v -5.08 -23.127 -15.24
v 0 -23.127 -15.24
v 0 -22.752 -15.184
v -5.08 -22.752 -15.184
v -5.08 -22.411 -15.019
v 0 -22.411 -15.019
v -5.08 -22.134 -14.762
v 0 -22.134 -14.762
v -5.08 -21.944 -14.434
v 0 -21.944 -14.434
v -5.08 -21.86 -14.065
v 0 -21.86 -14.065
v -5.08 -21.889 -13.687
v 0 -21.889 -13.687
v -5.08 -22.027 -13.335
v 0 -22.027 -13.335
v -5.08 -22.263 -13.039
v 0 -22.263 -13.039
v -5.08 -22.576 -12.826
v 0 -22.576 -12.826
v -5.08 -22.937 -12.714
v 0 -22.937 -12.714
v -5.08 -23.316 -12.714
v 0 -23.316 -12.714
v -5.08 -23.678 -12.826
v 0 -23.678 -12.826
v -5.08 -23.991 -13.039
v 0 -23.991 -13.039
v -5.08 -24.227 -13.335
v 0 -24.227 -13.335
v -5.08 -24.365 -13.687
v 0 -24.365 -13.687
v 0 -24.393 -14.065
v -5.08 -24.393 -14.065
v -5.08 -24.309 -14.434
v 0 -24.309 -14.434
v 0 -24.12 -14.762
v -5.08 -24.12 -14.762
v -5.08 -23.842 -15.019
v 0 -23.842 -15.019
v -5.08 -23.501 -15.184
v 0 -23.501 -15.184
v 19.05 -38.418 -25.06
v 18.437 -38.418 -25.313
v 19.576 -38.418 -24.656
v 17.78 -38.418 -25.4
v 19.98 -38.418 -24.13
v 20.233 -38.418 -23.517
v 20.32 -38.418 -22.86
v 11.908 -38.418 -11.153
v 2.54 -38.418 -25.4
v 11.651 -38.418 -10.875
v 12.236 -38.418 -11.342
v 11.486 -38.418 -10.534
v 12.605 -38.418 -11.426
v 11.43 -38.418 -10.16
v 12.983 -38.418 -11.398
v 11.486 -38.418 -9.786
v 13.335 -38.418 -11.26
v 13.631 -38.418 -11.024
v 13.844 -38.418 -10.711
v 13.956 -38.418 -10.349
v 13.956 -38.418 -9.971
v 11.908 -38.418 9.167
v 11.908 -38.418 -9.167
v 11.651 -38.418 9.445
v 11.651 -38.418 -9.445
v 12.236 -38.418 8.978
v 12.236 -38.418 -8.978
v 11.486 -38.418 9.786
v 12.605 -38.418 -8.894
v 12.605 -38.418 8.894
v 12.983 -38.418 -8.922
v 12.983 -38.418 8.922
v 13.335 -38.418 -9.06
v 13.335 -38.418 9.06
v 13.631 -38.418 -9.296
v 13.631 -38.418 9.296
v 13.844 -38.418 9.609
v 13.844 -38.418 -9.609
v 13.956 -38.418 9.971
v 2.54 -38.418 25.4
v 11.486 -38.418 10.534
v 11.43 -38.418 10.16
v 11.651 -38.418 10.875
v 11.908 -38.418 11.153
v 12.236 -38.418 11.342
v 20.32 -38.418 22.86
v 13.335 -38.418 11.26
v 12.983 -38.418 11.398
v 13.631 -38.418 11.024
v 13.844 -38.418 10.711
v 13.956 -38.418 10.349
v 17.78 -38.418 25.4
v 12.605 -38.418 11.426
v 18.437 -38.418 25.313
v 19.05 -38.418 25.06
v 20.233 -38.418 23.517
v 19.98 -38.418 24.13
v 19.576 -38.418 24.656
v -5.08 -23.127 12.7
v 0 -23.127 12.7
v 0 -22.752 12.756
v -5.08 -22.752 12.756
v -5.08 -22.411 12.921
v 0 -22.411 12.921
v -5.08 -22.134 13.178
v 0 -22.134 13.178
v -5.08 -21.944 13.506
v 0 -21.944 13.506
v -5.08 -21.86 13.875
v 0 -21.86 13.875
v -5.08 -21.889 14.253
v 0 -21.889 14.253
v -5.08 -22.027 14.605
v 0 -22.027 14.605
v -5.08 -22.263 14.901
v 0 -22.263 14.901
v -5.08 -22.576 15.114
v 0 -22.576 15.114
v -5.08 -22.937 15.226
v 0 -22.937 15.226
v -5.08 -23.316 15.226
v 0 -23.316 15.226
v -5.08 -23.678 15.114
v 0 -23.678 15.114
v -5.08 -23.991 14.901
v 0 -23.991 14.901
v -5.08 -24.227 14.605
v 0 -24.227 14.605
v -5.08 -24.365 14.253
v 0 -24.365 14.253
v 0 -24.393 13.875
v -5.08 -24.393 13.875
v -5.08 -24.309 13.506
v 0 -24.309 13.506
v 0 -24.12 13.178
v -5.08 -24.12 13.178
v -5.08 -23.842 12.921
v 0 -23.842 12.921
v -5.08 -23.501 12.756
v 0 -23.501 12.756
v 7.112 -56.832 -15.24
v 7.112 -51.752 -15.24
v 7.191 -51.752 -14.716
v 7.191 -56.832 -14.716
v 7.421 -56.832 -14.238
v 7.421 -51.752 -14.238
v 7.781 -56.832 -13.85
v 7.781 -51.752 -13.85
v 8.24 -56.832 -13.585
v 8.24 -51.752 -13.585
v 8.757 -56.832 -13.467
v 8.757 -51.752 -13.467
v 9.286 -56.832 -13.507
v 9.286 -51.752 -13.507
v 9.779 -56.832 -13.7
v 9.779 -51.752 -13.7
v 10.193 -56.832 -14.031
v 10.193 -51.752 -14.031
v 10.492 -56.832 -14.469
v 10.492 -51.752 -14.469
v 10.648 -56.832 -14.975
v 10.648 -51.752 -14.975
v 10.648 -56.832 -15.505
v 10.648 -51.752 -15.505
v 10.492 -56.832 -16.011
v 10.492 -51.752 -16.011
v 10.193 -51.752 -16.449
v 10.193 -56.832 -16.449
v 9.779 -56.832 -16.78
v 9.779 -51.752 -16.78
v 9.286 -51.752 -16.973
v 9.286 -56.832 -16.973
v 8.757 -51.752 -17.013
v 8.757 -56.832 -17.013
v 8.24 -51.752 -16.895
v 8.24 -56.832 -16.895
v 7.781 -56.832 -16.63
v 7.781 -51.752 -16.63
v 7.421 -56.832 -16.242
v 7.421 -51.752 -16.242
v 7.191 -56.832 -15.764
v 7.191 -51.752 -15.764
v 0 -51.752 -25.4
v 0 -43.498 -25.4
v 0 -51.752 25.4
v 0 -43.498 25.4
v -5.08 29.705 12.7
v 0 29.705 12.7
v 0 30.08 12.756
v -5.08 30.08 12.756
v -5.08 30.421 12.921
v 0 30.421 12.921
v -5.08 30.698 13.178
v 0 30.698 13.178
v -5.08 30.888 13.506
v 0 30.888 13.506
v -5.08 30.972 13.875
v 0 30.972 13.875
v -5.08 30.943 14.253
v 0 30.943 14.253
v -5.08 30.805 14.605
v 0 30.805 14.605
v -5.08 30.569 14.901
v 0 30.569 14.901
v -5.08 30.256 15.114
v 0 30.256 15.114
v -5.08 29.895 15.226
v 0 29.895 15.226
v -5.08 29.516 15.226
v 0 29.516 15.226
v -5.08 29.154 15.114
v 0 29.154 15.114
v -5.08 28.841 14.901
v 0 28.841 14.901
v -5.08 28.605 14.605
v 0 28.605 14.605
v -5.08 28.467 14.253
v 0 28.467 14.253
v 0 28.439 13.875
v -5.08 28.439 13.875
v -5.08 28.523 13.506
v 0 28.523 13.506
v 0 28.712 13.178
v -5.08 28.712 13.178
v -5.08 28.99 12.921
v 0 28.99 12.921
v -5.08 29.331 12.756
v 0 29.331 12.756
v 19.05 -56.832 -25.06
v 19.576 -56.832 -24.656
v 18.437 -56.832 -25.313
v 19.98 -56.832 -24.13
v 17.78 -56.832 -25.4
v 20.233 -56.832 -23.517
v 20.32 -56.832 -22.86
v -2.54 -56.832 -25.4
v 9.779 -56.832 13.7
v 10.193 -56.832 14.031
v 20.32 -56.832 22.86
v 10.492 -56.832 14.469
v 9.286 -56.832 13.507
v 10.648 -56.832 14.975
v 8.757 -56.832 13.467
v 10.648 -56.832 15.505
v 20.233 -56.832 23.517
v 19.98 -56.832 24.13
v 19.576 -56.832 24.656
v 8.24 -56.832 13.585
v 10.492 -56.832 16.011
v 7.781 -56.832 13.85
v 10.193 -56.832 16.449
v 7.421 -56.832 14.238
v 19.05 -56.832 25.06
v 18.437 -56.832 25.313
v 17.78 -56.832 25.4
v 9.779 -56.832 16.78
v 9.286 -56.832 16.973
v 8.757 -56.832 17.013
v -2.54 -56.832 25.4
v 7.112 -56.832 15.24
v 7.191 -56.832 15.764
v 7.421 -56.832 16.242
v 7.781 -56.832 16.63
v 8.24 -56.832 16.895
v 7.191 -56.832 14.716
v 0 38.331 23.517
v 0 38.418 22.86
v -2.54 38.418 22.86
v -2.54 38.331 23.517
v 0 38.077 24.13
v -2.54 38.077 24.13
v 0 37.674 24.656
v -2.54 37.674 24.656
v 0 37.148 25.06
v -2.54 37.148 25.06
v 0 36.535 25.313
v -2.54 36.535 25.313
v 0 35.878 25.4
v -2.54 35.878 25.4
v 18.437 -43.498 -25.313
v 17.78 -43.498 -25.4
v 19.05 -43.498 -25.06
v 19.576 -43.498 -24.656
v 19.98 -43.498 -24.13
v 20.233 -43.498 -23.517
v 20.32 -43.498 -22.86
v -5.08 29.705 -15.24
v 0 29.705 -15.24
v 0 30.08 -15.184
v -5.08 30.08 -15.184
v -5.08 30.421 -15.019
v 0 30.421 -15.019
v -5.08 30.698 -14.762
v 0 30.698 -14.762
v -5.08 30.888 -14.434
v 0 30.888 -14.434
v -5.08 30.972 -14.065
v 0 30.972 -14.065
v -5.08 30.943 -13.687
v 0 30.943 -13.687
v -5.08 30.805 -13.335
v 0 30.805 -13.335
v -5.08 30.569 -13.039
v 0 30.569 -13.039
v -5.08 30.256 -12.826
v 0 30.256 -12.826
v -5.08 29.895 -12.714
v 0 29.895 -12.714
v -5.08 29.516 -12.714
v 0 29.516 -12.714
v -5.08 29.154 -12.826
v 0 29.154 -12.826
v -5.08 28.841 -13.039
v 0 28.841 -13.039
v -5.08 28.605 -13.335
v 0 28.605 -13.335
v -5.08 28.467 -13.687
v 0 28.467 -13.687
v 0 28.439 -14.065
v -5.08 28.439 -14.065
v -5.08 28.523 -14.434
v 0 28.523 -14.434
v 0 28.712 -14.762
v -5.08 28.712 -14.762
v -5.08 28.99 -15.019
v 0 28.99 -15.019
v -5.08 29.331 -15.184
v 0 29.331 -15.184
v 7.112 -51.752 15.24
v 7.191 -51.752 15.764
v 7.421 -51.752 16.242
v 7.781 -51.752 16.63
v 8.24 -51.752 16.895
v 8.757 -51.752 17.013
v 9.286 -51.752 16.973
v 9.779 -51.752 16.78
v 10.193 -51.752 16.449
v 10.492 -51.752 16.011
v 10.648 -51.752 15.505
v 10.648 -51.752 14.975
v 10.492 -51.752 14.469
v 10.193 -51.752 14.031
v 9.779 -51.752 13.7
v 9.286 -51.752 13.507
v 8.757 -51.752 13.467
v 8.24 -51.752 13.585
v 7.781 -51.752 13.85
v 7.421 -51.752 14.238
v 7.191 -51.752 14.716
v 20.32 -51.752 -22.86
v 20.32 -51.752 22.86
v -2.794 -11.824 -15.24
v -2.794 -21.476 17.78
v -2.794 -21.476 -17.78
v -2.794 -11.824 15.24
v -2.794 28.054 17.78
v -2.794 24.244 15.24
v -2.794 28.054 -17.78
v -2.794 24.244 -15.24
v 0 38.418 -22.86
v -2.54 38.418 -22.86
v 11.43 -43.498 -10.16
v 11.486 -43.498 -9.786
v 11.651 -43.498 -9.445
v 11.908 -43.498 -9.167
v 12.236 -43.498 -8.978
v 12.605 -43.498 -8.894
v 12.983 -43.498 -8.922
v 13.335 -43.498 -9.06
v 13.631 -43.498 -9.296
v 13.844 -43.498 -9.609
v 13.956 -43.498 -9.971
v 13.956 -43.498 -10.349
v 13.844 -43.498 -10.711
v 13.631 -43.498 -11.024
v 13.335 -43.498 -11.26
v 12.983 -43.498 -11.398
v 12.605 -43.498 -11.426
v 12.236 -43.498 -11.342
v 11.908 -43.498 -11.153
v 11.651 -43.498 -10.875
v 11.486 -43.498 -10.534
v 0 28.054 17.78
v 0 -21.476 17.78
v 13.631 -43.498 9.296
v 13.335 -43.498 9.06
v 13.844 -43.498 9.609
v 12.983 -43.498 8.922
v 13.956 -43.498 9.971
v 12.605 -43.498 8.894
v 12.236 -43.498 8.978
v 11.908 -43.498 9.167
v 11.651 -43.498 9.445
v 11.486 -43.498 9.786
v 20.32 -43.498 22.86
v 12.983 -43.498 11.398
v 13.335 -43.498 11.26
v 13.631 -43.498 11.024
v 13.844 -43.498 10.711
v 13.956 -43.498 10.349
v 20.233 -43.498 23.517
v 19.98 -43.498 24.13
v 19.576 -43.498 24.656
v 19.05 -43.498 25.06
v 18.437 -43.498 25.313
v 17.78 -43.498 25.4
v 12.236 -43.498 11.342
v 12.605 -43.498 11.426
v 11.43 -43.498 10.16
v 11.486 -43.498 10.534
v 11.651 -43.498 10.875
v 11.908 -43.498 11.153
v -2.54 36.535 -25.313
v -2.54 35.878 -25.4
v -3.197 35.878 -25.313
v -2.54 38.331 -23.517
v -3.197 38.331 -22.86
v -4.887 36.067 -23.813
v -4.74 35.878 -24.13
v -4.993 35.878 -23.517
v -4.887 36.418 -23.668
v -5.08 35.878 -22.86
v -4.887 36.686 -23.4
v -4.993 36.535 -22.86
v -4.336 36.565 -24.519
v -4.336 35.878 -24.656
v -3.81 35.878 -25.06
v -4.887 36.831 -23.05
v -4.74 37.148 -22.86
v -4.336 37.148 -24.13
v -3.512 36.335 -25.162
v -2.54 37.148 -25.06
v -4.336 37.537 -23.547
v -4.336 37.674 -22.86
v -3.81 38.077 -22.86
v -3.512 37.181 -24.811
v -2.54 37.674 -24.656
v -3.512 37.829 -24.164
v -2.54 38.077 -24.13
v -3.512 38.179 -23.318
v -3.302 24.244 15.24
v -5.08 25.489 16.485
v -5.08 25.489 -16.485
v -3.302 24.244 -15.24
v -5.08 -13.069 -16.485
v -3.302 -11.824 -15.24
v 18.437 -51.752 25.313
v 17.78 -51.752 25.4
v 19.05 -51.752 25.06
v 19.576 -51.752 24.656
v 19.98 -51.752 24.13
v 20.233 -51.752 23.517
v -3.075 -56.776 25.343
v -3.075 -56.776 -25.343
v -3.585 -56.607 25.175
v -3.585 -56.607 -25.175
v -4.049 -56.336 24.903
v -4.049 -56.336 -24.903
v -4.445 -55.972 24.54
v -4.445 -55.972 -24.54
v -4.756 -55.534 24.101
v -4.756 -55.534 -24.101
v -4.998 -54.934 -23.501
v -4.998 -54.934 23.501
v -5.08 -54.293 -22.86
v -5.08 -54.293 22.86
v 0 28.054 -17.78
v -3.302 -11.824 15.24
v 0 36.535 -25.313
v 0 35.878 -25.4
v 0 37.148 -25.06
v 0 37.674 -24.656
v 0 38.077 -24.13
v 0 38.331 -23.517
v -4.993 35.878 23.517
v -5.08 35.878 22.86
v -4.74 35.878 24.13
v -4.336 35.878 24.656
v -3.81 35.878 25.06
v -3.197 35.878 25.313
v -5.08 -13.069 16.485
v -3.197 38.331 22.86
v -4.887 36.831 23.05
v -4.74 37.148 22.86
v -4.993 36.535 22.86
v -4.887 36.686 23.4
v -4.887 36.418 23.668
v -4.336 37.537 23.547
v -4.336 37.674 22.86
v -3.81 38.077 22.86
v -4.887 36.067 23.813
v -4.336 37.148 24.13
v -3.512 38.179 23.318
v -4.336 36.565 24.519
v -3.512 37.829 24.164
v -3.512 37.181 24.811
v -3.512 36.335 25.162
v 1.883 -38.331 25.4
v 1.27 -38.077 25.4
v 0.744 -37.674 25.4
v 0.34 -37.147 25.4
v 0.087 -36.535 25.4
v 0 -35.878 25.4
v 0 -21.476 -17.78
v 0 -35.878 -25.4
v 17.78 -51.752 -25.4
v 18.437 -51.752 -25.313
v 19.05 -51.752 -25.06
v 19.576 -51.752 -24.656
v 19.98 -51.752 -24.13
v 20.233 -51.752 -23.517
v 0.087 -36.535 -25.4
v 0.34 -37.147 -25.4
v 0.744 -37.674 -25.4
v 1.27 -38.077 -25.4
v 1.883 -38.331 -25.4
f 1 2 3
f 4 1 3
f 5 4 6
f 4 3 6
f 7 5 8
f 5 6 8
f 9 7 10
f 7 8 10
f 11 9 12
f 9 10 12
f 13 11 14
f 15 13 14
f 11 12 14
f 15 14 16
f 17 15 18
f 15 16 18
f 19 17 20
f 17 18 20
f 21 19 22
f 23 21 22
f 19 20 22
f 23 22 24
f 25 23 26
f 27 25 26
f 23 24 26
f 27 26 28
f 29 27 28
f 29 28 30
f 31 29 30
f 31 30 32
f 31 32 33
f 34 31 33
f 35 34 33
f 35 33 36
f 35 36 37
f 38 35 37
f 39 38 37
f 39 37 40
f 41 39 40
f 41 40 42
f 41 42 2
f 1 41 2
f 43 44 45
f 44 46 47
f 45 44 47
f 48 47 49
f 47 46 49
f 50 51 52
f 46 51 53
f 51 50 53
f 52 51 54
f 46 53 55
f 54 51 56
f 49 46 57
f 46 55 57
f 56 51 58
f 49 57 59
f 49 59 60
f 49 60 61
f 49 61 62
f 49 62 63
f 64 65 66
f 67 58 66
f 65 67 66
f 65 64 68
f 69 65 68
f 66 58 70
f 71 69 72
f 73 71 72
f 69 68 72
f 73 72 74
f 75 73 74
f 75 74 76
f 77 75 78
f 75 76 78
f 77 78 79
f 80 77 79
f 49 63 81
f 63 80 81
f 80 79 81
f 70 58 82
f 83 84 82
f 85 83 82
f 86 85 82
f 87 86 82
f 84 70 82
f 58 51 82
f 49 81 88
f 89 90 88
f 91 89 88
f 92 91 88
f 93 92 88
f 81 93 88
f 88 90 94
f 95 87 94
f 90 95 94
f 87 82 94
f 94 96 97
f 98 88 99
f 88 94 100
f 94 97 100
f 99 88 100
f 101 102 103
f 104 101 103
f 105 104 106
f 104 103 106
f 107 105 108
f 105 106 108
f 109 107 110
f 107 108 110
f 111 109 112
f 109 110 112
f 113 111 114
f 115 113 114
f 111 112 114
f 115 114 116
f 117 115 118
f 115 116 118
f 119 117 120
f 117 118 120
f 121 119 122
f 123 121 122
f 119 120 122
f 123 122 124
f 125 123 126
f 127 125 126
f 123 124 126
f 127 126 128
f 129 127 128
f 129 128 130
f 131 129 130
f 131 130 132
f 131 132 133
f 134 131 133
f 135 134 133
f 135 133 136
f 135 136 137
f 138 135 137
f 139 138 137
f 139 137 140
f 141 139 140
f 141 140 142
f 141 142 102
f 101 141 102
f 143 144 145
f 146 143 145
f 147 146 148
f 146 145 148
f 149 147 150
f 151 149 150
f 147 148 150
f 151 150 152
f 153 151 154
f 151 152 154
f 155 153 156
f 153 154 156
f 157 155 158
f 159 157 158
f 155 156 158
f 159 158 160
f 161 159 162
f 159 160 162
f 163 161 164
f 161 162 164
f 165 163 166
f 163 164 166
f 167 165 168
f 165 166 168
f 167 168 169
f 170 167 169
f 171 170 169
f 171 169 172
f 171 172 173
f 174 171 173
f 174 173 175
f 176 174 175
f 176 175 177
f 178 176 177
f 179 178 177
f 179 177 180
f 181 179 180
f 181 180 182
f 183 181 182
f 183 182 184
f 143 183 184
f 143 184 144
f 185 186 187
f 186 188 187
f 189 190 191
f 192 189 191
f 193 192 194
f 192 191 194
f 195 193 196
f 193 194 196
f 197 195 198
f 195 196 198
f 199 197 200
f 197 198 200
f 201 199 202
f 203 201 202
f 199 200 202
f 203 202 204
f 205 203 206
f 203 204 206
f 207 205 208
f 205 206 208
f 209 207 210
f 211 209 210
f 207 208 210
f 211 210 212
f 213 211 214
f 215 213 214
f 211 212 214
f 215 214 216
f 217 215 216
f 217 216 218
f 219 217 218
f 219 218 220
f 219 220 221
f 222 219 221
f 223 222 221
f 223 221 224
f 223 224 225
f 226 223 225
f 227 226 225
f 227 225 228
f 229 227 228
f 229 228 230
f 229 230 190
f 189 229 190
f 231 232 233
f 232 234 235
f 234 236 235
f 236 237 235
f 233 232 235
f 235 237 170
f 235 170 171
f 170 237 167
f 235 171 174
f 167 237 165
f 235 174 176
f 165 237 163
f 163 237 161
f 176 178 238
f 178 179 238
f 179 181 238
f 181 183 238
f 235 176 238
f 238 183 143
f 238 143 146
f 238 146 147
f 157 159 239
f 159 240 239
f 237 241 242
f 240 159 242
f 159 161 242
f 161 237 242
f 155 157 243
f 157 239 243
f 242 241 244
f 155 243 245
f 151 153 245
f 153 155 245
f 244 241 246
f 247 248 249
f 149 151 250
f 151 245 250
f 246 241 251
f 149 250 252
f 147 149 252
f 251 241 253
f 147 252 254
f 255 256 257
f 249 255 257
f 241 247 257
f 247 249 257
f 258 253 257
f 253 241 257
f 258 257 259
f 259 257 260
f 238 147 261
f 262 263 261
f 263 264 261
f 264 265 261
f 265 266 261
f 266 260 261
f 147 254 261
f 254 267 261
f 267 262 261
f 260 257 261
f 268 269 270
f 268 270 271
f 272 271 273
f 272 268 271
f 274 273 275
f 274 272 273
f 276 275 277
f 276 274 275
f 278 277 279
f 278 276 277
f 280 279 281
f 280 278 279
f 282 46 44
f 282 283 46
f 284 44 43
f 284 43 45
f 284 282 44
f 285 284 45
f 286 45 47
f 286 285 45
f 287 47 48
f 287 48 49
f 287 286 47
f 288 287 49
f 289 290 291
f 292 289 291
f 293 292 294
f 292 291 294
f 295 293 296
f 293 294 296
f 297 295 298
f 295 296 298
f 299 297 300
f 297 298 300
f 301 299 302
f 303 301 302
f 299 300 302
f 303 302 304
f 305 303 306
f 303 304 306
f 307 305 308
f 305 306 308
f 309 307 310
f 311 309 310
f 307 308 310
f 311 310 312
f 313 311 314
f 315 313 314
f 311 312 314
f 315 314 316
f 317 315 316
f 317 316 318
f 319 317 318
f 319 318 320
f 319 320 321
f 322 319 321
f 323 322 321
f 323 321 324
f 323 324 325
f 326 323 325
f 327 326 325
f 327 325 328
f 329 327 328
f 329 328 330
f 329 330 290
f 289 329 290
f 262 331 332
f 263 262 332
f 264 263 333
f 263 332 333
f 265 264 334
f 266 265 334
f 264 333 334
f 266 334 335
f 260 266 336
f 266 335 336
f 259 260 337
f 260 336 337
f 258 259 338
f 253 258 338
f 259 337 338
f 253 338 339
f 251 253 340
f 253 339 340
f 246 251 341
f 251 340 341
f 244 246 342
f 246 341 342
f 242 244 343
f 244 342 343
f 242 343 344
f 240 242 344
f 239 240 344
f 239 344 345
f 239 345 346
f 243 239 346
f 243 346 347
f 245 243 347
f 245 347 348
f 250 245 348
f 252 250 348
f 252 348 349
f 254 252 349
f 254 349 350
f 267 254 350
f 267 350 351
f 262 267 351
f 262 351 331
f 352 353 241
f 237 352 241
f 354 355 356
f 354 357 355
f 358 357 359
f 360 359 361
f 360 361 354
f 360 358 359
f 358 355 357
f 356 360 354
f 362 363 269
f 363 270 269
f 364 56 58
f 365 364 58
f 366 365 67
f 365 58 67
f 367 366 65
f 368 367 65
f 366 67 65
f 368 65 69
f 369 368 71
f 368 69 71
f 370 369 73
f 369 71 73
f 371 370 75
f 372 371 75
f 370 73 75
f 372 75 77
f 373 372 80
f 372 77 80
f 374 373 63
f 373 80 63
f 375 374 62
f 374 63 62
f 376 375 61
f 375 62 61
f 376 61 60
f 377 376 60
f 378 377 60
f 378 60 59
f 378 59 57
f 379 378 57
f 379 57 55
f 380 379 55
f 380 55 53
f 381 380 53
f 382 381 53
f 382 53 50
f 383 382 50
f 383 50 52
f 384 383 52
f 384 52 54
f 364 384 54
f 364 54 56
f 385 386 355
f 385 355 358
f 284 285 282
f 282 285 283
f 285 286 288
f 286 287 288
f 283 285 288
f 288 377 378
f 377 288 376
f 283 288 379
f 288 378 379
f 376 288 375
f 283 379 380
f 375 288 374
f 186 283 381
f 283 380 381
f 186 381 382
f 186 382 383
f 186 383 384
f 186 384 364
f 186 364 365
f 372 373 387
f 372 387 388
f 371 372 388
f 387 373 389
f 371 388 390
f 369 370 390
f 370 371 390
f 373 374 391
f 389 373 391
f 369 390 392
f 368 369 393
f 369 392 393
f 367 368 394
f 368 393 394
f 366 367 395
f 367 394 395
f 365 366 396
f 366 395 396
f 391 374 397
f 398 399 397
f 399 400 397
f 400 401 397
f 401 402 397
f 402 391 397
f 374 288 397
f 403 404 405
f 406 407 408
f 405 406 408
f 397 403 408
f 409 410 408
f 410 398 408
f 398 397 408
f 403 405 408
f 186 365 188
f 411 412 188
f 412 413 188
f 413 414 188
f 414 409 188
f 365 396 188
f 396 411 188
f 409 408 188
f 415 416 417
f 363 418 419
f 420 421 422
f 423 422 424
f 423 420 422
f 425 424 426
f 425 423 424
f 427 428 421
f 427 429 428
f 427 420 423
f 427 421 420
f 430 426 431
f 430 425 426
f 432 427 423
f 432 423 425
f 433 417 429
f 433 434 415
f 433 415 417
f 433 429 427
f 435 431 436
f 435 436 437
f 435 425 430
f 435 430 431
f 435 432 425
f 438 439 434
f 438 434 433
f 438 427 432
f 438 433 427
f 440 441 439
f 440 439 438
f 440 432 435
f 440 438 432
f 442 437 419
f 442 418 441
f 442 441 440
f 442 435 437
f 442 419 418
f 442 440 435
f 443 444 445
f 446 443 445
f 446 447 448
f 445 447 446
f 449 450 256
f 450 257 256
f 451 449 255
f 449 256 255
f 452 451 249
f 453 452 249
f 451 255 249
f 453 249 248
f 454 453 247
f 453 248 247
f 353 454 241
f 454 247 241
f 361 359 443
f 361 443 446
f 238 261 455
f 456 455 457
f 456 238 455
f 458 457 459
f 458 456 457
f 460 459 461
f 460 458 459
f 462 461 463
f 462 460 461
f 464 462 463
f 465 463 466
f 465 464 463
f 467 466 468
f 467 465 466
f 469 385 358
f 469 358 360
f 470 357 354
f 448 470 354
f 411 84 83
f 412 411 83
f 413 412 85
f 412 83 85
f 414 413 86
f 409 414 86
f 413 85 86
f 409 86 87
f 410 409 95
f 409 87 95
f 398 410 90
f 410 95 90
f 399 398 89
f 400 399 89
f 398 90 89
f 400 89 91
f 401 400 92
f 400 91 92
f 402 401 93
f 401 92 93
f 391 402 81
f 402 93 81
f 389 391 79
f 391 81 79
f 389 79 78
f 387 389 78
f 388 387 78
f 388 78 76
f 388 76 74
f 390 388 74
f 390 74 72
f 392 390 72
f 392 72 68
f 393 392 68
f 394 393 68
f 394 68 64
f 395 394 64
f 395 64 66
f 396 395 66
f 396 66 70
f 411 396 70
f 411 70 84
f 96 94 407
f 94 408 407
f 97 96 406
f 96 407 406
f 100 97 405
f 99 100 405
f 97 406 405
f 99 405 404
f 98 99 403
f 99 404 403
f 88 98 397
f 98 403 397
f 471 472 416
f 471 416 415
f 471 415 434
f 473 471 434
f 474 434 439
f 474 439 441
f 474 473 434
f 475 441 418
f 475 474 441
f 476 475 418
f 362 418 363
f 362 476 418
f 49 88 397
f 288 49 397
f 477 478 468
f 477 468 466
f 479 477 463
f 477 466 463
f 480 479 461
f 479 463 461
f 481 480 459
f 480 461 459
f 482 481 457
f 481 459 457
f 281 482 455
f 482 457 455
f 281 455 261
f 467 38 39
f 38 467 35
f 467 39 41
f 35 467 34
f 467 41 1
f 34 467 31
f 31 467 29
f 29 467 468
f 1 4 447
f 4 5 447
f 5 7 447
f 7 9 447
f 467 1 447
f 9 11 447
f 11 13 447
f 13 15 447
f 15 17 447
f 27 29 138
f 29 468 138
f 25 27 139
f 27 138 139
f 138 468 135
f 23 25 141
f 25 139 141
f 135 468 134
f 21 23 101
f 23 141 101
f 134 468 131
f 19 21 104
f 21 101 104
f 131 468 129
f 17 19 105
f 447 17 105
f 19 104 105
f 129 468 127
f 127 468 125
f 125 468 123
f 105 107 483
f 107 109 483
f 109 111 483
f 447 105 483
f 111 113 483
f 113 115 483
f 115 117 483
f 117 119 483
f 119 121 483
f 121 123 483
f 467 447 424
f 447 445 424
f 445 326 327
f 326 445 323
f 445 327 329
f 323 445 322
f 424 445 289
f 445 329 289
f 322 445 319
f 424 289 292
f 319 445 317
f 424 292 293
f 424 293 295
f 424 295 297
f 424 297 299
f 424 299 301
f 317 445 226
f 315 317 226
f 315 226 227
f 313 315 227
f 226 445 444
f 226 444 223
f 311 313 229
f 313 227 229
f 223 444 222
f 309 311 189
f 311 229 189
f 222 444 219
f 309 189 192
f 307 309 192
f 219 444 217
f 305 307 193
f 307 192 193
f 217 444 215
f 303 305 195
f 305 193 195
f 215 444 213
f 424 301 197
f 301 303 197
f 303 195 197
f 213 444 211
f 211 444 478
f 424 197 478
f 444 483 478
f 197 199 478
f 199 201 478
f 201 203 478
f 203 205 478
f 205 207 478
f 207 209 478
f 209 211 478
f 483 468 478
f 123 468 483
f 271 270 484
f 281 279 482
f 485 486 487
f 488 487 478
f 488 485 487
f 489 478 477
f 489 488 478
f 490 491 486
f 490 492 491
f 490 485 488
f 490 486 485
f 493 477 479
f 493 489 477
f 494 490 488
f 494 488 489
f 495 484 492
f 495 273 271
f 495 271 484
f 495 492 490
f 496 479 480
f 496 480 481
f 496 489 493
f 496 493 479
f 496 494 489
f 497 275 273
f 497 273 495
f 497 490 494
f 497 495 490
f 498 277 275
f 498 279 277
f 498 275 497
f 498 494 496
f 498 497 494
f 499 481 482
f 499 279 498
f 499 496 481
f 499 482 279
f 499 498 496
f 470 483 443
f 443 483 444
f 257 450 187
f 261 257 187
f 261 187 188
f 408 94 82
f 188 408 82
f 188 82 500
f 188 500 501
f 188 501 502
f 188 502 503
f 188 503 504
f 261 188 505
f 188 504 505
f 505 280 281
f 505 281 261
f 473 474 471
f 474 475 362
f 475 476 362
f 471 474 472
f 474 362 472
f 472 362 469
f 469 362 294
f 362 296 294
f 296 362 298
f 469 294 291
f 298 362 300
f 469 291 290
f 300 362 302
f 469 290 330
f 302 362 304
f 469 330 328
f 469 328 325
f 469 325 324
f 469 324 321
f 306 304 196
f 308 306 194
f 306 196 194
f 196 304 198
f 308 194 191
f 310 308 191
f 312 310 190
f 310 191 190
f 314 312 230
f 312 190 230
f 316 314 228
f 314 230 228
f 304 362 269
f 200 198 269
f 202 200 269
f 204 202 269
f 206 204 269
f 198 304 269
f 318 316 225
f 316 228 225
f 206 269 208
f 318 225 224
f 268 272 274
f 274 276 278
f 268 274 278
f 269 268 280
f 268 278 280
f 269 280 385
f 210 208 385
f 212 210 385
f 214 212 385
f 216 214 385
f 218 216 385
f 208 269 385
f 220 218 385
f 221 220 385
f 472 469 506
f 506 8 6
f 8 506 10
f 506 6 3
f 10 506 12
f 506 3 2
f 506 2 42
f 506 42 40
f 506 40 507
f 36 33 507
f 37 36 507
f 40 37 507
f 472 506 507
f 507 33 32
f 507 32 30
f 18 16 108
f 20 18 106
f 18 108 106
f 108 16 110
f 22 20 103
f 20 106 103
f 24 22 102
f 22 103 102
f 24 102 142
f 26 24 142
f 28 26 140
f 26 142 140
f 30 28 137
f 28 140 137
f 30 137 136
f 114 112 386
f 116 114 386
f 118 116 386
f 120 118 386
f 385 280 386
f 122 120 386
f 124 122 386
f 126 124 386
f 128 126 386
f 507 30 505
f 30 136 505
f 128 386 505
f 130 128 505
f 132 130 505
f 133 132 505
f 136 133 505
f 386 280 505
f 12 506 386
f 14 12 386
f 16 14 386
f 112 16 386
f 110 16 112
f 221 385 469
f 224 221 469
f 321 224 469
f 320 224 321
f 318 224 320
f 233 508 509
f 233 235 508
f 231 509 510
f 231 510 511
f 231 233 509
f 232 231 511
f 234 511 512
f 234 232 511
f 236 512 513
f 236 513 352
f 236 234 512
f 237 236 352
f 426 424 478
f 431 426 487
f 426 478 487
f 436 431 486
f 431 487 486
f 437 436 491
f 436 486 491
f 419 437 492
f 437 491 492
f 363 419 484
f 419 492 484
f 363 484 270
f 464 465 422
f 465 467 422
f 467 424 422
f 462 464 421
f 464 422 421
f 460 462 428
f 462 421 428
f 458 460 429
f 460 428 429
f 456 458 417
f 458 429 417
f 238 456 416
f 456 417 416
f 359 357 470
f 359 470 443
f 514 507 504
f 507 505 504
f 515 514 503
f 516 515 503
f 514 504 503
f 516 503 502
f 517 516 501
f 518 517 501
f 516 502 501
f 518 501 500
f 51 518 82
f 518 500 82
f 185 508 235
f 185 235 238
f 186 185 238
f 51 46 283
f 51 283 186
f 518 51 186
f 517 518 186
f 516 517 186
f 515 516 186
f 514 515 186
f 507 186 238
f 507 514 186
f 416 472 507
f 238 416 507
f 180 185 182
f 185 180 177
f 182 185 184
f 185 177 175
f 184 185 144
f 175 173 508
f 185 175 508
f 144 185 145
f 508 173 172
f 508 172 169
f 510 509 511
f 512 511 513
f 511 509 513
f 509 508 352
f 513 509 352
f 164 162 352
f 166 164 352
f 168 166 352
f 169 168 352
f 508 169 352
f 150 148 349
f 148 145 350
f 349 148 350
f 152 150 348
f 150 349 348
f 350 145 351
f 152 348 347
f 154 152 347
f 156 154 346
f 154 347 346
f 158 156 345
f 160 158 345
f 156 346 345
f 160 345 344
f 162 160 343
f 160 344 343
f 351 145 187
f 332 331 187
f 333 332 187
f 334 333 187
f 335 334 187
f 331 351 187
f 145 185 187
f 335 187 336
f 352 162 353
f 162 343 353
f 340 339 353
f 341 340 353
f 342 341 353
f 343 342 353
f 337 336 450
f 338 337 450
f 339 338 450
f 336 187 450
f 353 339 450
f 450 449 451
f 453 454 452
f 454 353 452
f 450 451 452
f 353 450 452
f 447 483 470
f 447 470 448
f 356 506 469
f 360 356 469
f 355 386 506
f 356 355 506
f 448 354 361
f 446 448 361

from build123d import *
from OCP.BRepFilletAPI import BRepFilletAPI_MakeChamfer

# Parameters (mm, degrees)
BOSS_EXTRUDE7_DEPTH = 25.4
SKETCH14_W          = 30.48
SKETCH14_H          = 36.068
CUT_EXTRUDE3_DEPTH  = 66.482787481
SKETCH15_W          = 35.56
SKETCH15_H          = 49.53
CUT_EXTRUDE4_DEPTH  = 2.794
CHAMFER1_SIZE       = 1.778
CHAMFER1_SIZE2      = 1.244969003
SKETCH16_R          = 1.27
CUT_EXTRUDE5_DEPTH  = 66.482787481
FILLET4_R           = 2.54
FILLET5_R           = 2.54
SKETCH23_R          = 1.778
CUT_EXTRUDE6_DEPTH  = 96.857661666
FILLET6_R           = 2.54
CUT_EXTRUDE7_REACH  = 85.437
SKETCH24_R          = 1.27
FILLET7_R           = 2.54


with BuildPart() as part:
    # Sketch12 → Boss-Extrude7 (new, symmetric)
    with BuildSketch(Plane.XY):
        Polygon((0, -38.4175), (20.32, -38.4175), (20.32, -43.4975), (0, -43.4975), (0, -51.7525), (20.32, -51.7525), (20.32, -56.8325), (-5.08, -56.8325), (-5.08, 38.4175), (0, 38.4175), align=None)
    extrude(amount=BOSS_EXTRUDE7_DEPTH, both=True)

    # Sketch14 → Cut-Extrude3 (cut, through all)
    with BuildSketch(Plane(origin=(0, 0, 0), x_dir=(0, 0, -1), z_dir=(1, 0, 0))):
        with Locations((0, 6.2103)):
            Rectangle(SKETCH14_W, SKETCH14_H)
    extrude(amount=-CUT_EXTRUDE3_DEPTH, mode=Mode.SUBTRACT)

    # Sketch15 → Cut-Extrude4 (cut)
    with BuildSketch(Plane(origin=(0, 0, 0), x_dir=(0, 0, -1), z_dir=(1, 0, 0))):
        with Locations((0, 3.2893)):
            Rectangle(SKETCH15_W, SKETCH15_H)
    extrude(amount=-CUT_EXTRUDE4_DEPTH, mode=Mode.SUBTRACT)

    # Chamfer1: one chamfer whose edges measure the first distance from different faces: ONE call of the kernel's chamfer builder (chamfer() names one face for all edges)
    chamfer1_edges_1 = [part.edges().sort_by_distance(p)[0] for p in [
        (-5.08, 6.2103, -15.24),
    ]]
    chamfer1_side_1 = [part.faces().sort_by_distance(p)[0] for p in [
        (-3.937, 6.2103, -15.24),
    ]]
    chamfer1_edges_2 = [part.edges().sort_by_distance(p)[0] for p in [
        (-5.08, -11.8237, 0),
    ]]
    chamfer1_side_2 = [part.faces().sort_by_distance(p)[0] for p in [
        (-3.937, -11.8237, 0),
    ]]
    chamfer1_edges_3 = [part.edges().sort_by_distance(p)[0] for p in [
        (-5.08, 6.2103, 15.24),
    ]]
    chamfer1_side_3 = [part.faces().sort_by_distance(p)[0] for p in [
        (-3.937, 6.2103, 15.24),
    ]]
    chamfer1_edges_4 = [part.edges().sort_by_distance(p)[0] for p in [
        (-5.08, 24.2443, 0),
    ]]
    chamfer1_side_4 = [part.faces().sort_by_distance(p)[0] for p in [
        (-3.937, 24.2443, 0),
    ]]
    chamfer1 = BRepFilletAPI_MakeChamfer(part.part.solid().wrapped)
    for e in chamfer1_edges_1:
        chamfer1.Add(CHAMFER1_SIZE, CHAMFER1_SIZE2, e.wrapped, chamfer1_side_1[0].wrapped)  # the first distance lies on this face
    for e in chamfer1_edges_2:
        chamfer1.Add(CHAMFER1_SIZE, CHAMFER1_SIZE2, e.wrapped, chamfer1_side_2[0].wrapped)  # the first distance lies on this face
    for e in chamfer1_edges_3:
        chamfer1.Add(CHAMFER1_SIZE, CHAMFER1_SIZE2, e.wrapped, chamfer1_side_3[0].wrapped)  # the first distance lies on this face
    for e in chamfer1_edges_4:
        chamfer1.Add(CHAMFER1_SIZE, CHAMFER1_SIZE2, e.wrapped, chamfer1_side_4[0].wrapped)  # the first distance lies on this face
    add(Compound.cast(chamfer1.Shape()), mode=Mode.REPLACE)

    # Sketch16 → Cut-Extrude5 (cut, through all)
    with BuildSketch(Plane(origin=(0, 0, 0), x_dir=(0, 0, -1), z_dir=(1, 0, 0))):
        with Locations((-13.97, 29.7053)):
            Circle(SKETCH16_R)
        with Locations((13.97, 29.7053)):
            Circle(SKETCH16_R)
        with Locations((-13.97, -23.1267)):
            Circle(SKETCH16_R)
        with Locations((13.97, -23.1267)):
            Circle(SKETCH16_R)
    extrude(amount=-CUT_EXTRUDE5_DEPTH, mode=Mode.SUBTRACT)

    # Fillet4
    fillet4_edges = [part.edges().sort_by_distance(p)[0] for p in [
        (-2.54, 38.4175, 25.4),
        (-2.54, 38.4175, -25.4),
    ]]
    fillet(fillet4_edges, radius=FILLET4_R)

    # Fillet5
    fillet5_edges = [part.edges().sort_by_distance(p)[0] for p in [
        (20.32, -54.2925, 25.4),
        (20.32, -40.9575, -25.4),
        (20.32, -54.2925, -25.4),
        (20.32, -40.9575, 25.4),
    ]]
    fillet(fillet5_edges, radius=FILLET5_R)

    # Sketch23 → Cut-Extrude6 (cut, through all)
    with BuildSketch(Plane(origin=(0, -51.7525, 0), x_dir=(1, 0, 0), z_dir=(0, 1, 0))):
        with Locations(Location((8.89, 15.24, 0), (0, 0, 180))):
            Circle(SKETCH23_R)
        with Locations(Location((8.89, -15.24, 0), (0, 0, 180))):
            Circle(SKETCH23_R)
    extrude(amount=-CUT_EXTRUDE6_DEPTH, mode=Mode.SUBTRACT)

    # Fillet6
    fillet6_edges = [part.edges().sort_by_distance(p)[0] for p in [
        (-5.08, -56.8325, 0),
        (-5.08, 38.4175, 0),
        (-5.08, -10.4775, -25.4),
        (-5.08, -10.4775, 25.4),
        (-5.08, 37.673551224, 24.656051224),
        (-5.08, 37.673551224, -24.656051224),
    ]]
    fillet(fillet6_edges, radius=FILLET6_R)

    # Sketch24 → Cut-Extrude7 (cut, up to next)
    with BuildSketch(Plane(origin=(0, -38.4175, 0), x_dir=(1, 0, 0), z_dir=(0, 1, 0)), mode=Mode.PRIVATE) as cut_extrude7_sk1:
        with Locations(Location((12.7, 10.16, 0), (0, 0, 180))):
            Circle(SKETCH24_R)
    cut_extrude7_tool1 = extrude(cut_extrude7_sk1.sketch, amount=-CUT_EXTRUDE7_REACH, mode=Mode.PRIVATE) & part.part
    # Sketch24 → Cut-Extrude7 (cut, up to next)
    with BuildSketch(Plane(origin=(0, -38.4175, 0), x_dir=(1, 0, 0), z_dir=(0, 1, 0)), mode=Mode.PRIVATE) as cut_extrude7_sk2:
        with Locations(Location((12.7, -10.16, 0), (0, 0, 180))):
            Circle(SKETCH24_R)
    cut_extrude7_tool2 = extrude(cut_extrude7_sk2.sketch, amount=-CUT_EXTRUDE7_REACH, mode=Mode.PRIVATE) & part.part
    add(cut_extrude7_tool1.solids().sort_by_distance((12.7, -38.4175, -10.16))[0], mode=Mode.SUBTRACT)
    add(cut_extrude7_tool2.solids().sort_by_distance((12.7, -38.4175, 10.16))[0], mode=Mode.SUBTRACT)

    # Fillet7
    fillet7_edges = [part.edges().sort_by_distance(p)[0] for p in [
        (0, -38.4175, 0),
    ]]
    fillet(fillet7_edges, radius=FILLET7_R)


solid = part.part
